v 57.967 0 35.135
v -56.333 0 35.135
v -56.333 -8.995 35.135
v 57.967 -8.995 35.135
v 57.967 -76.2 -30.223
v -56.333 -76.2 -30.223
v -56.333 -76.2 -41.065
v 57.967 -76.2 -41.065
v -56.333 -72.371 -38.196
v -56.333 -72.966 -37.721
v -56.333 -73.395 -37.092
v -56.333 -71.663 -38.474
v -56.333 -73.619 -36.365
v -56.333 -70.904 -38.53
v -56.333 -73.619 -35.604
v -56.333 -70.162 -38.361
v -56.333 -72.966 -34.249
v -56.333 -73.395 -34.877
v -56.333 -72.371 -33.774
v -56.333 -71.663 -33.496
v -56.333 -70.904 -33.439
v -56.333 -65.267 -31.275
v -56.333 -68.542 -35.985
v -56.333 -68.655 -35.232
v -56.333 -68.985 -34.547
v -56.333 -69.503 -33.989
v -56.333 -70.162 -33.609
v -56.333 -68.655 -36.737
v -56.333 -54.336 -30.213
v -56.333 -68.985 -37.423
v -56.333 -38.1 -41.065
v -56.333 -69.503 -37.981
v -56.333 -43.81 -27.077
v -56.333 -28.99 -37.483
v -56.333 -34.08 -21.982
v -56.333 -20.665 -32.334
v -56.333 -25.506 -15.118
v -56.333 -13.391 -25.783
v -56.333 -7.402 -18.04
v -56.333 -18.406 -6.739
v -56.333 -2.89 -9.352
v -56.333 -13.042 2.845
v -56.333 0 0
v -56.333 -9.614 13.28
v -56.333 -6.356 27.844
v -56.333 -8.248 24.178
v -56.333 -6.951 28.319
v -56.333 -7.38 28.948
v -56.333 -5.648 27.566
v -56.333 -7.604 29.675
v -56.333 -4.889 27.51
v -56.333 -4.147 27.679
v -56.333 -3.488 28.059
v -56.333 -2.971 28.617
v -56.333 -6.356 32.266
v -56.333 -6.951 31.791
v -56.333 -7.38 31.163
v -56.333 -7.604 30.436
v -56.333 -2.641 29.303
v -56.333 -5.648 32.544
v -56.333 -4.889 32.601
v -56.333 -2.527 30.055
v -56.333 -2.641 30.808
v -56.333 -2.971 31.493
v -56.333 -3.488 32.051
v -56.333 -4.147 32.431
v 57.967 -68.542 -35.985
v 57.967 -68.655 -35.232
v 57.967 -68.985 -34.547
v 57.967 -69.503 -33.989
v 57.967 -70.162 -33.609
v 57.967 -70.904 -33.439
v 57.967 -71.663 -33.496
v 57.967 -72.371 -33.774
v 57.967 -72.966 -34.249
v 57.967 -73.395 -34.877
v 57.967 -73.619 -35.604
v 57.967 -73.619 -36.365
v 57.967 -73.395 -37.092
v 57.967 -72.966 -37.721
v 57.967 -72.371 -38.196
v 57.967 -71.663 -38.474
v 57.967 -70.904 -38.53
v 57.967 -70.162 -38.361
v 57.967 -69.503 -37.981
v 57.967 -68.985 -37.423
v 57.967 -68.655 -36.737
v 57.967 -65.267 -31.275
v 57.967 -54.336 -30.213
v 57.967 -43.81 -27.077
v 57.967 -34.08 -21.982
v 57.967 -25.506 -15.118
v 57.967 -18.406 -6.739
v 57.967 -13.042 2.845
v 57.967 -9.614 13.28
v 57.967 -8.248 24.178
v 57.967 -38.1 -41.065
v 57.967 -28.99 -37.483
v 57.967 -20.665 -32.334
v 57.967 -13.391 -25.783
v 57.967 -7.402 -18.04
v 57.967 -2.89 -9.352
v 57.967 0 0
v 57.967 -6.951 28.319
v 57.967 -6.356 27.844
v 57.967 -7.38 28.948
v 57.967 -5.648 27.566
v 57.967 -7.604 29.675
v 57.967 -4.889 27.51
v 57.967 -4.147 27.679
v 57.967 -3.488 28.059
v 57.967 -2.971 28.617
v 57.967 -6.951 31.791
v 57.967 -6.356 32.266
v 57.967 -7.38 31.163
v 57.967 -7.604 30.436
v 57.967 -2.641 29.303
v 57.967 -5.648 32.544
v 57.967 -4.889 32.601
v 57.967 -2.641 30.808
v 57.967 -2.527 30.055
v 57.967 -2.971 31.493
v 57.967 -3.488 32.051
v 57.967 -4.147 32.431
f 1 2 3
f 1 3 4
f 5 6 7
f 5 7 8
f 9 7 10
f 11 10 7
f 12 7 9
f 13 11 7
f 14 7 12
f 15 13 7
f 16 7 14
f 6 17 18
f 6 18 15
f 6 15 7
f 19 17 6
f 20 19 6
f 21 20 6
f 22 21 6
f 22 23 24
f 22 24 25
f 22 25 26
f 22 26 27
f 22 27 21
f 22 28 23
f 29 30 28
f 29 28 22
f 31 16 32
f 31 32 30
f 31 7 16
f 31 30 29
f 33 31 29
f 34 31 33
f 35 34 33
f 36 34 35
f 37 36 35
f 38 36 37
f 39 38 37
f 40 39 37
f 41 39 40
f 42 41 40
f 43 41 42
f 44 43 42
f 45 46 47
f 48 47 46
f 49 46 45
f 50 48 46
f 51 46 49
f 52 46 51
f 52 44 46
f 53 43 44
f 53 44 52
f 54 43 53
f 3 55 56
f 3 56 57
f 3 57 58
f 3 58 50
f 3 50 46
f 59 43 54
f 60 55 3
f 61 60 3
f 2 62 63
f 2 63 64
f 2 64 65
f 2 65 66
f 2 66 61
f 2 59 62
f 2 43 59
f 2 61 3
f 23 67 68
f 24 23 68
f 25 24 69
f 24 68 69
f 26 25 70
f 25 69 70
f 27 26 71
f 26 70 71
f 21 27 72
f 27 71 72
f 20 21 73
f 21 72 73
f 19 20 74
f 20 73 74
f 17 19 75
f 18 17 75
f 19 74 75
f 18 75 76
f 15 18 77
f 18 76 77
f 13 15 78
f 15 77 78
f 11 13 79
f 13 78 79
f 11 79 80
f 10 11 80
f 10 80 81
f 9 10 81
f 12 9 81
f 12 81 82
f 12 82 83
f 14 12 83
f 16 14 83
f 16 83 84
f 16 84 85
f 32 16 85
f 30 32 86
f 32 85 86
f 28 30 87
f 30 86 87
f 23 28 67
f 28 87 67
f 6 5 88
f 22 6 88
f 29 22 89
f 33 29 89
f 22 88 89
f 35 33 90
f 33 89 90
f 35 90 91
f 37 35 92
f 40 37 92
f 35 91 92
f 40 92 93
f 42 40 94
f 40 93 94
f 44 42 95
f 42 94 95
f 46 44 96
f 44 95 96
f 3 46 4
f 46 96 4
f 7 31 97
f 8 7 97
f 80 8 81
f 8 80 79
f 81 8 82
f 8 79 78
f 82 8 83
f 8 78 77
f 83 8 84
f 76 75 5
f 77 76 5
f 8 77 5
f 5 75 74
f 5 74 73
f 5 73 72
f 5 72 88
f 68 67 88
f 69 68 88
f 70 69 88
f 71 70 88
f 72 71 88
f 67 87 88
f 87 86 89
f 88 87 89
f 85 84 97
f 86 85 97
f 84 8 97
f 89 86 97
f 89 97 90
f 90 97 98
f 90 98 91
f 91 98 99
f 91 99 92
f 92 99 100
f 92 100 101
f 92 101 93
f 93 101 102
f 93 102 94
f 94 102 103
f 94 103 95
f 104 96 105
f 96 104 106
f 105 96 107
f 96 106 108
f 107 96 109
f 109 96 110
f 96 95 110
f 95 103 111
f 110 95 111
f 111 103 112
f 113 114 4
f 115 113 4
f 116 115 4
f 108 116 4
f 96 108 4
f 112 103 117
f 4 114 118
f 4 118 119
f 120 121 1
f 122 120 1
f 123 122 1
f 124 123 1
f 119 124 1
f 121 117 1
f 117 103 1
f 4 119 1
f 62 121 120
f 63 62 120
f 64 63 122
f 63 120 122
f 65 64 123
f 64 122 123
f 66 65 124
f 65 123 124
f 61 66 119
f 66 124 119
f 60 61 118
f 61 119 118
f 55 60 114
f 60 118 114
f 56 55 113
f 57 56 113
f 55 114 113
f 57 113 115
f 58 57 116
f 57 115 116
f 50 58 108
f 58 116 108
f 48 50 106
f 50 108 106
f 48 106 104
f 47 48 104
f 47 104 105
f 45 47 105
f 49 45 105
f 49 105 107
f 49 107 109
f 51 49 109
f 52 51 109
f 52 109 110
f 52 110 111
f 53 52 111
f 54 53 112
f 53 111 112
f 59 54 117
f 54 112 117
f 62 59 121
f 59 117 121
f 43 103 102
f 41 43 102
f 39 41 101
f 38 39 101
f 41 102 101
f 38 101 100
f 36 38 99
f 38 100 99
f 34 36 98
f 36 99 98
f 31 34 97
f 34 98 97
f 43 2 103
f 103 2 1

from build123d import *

# Parameters (mm, degrees)
F0_W     = 114.3
F0_H     = 76.2
F1_DEPTH = 76.2
F2_R     = 2.5527
F3_DEPTH = 114.3


# Not quite as in the source:
# - a feature names something its author has since deleted; it is built from what else it names


with BuildPart() as f1:
    # F0 (on Front) → F1 (new body)
    with BuildSketch(Plane.XZ):
        with Locations((0.8173113427, -2.9648756608)):
            Rectangle(F0_W, F0_H)
    extrude(amount=F1_DEPTH)

    # F2 (on face) → F3 (cut)
    with BuildSketch(Plane.YZ.offset(57.9673113427)):
        with Locations((-71.0946, -35.9848756608)):
            Circle(F2_R)
        with Locations((-5.08, 30.0551243392)):
            Circle(F2_R)
        with BuildLine():
            ThreePointArc((0, 0), (-13.3911011826, -25.7827653055), (-38.1, -41.0648756608))
            Line((-38.1, -41.0648756608), (0, -41.0648756608))
            Line((0, -41.0648756608), (0, 0))
        make_face()
        with BuildLine():
            Line((-76.2, 35.1351243392), (-76.2, -30.2226077765))
            ThreePointArc((-76.2, -30.2226077765), (-25.506077145, -15.1181602946), (-8.9947013184, 35.1351243392))
            Line((-8.9947013184, 35.1351243392), (-76.2, 35.1351243392))
        make_face()
    extrude(amount=-F3_DEPTH, mode=Mode.SUBTRACT)


solid = f1.part
